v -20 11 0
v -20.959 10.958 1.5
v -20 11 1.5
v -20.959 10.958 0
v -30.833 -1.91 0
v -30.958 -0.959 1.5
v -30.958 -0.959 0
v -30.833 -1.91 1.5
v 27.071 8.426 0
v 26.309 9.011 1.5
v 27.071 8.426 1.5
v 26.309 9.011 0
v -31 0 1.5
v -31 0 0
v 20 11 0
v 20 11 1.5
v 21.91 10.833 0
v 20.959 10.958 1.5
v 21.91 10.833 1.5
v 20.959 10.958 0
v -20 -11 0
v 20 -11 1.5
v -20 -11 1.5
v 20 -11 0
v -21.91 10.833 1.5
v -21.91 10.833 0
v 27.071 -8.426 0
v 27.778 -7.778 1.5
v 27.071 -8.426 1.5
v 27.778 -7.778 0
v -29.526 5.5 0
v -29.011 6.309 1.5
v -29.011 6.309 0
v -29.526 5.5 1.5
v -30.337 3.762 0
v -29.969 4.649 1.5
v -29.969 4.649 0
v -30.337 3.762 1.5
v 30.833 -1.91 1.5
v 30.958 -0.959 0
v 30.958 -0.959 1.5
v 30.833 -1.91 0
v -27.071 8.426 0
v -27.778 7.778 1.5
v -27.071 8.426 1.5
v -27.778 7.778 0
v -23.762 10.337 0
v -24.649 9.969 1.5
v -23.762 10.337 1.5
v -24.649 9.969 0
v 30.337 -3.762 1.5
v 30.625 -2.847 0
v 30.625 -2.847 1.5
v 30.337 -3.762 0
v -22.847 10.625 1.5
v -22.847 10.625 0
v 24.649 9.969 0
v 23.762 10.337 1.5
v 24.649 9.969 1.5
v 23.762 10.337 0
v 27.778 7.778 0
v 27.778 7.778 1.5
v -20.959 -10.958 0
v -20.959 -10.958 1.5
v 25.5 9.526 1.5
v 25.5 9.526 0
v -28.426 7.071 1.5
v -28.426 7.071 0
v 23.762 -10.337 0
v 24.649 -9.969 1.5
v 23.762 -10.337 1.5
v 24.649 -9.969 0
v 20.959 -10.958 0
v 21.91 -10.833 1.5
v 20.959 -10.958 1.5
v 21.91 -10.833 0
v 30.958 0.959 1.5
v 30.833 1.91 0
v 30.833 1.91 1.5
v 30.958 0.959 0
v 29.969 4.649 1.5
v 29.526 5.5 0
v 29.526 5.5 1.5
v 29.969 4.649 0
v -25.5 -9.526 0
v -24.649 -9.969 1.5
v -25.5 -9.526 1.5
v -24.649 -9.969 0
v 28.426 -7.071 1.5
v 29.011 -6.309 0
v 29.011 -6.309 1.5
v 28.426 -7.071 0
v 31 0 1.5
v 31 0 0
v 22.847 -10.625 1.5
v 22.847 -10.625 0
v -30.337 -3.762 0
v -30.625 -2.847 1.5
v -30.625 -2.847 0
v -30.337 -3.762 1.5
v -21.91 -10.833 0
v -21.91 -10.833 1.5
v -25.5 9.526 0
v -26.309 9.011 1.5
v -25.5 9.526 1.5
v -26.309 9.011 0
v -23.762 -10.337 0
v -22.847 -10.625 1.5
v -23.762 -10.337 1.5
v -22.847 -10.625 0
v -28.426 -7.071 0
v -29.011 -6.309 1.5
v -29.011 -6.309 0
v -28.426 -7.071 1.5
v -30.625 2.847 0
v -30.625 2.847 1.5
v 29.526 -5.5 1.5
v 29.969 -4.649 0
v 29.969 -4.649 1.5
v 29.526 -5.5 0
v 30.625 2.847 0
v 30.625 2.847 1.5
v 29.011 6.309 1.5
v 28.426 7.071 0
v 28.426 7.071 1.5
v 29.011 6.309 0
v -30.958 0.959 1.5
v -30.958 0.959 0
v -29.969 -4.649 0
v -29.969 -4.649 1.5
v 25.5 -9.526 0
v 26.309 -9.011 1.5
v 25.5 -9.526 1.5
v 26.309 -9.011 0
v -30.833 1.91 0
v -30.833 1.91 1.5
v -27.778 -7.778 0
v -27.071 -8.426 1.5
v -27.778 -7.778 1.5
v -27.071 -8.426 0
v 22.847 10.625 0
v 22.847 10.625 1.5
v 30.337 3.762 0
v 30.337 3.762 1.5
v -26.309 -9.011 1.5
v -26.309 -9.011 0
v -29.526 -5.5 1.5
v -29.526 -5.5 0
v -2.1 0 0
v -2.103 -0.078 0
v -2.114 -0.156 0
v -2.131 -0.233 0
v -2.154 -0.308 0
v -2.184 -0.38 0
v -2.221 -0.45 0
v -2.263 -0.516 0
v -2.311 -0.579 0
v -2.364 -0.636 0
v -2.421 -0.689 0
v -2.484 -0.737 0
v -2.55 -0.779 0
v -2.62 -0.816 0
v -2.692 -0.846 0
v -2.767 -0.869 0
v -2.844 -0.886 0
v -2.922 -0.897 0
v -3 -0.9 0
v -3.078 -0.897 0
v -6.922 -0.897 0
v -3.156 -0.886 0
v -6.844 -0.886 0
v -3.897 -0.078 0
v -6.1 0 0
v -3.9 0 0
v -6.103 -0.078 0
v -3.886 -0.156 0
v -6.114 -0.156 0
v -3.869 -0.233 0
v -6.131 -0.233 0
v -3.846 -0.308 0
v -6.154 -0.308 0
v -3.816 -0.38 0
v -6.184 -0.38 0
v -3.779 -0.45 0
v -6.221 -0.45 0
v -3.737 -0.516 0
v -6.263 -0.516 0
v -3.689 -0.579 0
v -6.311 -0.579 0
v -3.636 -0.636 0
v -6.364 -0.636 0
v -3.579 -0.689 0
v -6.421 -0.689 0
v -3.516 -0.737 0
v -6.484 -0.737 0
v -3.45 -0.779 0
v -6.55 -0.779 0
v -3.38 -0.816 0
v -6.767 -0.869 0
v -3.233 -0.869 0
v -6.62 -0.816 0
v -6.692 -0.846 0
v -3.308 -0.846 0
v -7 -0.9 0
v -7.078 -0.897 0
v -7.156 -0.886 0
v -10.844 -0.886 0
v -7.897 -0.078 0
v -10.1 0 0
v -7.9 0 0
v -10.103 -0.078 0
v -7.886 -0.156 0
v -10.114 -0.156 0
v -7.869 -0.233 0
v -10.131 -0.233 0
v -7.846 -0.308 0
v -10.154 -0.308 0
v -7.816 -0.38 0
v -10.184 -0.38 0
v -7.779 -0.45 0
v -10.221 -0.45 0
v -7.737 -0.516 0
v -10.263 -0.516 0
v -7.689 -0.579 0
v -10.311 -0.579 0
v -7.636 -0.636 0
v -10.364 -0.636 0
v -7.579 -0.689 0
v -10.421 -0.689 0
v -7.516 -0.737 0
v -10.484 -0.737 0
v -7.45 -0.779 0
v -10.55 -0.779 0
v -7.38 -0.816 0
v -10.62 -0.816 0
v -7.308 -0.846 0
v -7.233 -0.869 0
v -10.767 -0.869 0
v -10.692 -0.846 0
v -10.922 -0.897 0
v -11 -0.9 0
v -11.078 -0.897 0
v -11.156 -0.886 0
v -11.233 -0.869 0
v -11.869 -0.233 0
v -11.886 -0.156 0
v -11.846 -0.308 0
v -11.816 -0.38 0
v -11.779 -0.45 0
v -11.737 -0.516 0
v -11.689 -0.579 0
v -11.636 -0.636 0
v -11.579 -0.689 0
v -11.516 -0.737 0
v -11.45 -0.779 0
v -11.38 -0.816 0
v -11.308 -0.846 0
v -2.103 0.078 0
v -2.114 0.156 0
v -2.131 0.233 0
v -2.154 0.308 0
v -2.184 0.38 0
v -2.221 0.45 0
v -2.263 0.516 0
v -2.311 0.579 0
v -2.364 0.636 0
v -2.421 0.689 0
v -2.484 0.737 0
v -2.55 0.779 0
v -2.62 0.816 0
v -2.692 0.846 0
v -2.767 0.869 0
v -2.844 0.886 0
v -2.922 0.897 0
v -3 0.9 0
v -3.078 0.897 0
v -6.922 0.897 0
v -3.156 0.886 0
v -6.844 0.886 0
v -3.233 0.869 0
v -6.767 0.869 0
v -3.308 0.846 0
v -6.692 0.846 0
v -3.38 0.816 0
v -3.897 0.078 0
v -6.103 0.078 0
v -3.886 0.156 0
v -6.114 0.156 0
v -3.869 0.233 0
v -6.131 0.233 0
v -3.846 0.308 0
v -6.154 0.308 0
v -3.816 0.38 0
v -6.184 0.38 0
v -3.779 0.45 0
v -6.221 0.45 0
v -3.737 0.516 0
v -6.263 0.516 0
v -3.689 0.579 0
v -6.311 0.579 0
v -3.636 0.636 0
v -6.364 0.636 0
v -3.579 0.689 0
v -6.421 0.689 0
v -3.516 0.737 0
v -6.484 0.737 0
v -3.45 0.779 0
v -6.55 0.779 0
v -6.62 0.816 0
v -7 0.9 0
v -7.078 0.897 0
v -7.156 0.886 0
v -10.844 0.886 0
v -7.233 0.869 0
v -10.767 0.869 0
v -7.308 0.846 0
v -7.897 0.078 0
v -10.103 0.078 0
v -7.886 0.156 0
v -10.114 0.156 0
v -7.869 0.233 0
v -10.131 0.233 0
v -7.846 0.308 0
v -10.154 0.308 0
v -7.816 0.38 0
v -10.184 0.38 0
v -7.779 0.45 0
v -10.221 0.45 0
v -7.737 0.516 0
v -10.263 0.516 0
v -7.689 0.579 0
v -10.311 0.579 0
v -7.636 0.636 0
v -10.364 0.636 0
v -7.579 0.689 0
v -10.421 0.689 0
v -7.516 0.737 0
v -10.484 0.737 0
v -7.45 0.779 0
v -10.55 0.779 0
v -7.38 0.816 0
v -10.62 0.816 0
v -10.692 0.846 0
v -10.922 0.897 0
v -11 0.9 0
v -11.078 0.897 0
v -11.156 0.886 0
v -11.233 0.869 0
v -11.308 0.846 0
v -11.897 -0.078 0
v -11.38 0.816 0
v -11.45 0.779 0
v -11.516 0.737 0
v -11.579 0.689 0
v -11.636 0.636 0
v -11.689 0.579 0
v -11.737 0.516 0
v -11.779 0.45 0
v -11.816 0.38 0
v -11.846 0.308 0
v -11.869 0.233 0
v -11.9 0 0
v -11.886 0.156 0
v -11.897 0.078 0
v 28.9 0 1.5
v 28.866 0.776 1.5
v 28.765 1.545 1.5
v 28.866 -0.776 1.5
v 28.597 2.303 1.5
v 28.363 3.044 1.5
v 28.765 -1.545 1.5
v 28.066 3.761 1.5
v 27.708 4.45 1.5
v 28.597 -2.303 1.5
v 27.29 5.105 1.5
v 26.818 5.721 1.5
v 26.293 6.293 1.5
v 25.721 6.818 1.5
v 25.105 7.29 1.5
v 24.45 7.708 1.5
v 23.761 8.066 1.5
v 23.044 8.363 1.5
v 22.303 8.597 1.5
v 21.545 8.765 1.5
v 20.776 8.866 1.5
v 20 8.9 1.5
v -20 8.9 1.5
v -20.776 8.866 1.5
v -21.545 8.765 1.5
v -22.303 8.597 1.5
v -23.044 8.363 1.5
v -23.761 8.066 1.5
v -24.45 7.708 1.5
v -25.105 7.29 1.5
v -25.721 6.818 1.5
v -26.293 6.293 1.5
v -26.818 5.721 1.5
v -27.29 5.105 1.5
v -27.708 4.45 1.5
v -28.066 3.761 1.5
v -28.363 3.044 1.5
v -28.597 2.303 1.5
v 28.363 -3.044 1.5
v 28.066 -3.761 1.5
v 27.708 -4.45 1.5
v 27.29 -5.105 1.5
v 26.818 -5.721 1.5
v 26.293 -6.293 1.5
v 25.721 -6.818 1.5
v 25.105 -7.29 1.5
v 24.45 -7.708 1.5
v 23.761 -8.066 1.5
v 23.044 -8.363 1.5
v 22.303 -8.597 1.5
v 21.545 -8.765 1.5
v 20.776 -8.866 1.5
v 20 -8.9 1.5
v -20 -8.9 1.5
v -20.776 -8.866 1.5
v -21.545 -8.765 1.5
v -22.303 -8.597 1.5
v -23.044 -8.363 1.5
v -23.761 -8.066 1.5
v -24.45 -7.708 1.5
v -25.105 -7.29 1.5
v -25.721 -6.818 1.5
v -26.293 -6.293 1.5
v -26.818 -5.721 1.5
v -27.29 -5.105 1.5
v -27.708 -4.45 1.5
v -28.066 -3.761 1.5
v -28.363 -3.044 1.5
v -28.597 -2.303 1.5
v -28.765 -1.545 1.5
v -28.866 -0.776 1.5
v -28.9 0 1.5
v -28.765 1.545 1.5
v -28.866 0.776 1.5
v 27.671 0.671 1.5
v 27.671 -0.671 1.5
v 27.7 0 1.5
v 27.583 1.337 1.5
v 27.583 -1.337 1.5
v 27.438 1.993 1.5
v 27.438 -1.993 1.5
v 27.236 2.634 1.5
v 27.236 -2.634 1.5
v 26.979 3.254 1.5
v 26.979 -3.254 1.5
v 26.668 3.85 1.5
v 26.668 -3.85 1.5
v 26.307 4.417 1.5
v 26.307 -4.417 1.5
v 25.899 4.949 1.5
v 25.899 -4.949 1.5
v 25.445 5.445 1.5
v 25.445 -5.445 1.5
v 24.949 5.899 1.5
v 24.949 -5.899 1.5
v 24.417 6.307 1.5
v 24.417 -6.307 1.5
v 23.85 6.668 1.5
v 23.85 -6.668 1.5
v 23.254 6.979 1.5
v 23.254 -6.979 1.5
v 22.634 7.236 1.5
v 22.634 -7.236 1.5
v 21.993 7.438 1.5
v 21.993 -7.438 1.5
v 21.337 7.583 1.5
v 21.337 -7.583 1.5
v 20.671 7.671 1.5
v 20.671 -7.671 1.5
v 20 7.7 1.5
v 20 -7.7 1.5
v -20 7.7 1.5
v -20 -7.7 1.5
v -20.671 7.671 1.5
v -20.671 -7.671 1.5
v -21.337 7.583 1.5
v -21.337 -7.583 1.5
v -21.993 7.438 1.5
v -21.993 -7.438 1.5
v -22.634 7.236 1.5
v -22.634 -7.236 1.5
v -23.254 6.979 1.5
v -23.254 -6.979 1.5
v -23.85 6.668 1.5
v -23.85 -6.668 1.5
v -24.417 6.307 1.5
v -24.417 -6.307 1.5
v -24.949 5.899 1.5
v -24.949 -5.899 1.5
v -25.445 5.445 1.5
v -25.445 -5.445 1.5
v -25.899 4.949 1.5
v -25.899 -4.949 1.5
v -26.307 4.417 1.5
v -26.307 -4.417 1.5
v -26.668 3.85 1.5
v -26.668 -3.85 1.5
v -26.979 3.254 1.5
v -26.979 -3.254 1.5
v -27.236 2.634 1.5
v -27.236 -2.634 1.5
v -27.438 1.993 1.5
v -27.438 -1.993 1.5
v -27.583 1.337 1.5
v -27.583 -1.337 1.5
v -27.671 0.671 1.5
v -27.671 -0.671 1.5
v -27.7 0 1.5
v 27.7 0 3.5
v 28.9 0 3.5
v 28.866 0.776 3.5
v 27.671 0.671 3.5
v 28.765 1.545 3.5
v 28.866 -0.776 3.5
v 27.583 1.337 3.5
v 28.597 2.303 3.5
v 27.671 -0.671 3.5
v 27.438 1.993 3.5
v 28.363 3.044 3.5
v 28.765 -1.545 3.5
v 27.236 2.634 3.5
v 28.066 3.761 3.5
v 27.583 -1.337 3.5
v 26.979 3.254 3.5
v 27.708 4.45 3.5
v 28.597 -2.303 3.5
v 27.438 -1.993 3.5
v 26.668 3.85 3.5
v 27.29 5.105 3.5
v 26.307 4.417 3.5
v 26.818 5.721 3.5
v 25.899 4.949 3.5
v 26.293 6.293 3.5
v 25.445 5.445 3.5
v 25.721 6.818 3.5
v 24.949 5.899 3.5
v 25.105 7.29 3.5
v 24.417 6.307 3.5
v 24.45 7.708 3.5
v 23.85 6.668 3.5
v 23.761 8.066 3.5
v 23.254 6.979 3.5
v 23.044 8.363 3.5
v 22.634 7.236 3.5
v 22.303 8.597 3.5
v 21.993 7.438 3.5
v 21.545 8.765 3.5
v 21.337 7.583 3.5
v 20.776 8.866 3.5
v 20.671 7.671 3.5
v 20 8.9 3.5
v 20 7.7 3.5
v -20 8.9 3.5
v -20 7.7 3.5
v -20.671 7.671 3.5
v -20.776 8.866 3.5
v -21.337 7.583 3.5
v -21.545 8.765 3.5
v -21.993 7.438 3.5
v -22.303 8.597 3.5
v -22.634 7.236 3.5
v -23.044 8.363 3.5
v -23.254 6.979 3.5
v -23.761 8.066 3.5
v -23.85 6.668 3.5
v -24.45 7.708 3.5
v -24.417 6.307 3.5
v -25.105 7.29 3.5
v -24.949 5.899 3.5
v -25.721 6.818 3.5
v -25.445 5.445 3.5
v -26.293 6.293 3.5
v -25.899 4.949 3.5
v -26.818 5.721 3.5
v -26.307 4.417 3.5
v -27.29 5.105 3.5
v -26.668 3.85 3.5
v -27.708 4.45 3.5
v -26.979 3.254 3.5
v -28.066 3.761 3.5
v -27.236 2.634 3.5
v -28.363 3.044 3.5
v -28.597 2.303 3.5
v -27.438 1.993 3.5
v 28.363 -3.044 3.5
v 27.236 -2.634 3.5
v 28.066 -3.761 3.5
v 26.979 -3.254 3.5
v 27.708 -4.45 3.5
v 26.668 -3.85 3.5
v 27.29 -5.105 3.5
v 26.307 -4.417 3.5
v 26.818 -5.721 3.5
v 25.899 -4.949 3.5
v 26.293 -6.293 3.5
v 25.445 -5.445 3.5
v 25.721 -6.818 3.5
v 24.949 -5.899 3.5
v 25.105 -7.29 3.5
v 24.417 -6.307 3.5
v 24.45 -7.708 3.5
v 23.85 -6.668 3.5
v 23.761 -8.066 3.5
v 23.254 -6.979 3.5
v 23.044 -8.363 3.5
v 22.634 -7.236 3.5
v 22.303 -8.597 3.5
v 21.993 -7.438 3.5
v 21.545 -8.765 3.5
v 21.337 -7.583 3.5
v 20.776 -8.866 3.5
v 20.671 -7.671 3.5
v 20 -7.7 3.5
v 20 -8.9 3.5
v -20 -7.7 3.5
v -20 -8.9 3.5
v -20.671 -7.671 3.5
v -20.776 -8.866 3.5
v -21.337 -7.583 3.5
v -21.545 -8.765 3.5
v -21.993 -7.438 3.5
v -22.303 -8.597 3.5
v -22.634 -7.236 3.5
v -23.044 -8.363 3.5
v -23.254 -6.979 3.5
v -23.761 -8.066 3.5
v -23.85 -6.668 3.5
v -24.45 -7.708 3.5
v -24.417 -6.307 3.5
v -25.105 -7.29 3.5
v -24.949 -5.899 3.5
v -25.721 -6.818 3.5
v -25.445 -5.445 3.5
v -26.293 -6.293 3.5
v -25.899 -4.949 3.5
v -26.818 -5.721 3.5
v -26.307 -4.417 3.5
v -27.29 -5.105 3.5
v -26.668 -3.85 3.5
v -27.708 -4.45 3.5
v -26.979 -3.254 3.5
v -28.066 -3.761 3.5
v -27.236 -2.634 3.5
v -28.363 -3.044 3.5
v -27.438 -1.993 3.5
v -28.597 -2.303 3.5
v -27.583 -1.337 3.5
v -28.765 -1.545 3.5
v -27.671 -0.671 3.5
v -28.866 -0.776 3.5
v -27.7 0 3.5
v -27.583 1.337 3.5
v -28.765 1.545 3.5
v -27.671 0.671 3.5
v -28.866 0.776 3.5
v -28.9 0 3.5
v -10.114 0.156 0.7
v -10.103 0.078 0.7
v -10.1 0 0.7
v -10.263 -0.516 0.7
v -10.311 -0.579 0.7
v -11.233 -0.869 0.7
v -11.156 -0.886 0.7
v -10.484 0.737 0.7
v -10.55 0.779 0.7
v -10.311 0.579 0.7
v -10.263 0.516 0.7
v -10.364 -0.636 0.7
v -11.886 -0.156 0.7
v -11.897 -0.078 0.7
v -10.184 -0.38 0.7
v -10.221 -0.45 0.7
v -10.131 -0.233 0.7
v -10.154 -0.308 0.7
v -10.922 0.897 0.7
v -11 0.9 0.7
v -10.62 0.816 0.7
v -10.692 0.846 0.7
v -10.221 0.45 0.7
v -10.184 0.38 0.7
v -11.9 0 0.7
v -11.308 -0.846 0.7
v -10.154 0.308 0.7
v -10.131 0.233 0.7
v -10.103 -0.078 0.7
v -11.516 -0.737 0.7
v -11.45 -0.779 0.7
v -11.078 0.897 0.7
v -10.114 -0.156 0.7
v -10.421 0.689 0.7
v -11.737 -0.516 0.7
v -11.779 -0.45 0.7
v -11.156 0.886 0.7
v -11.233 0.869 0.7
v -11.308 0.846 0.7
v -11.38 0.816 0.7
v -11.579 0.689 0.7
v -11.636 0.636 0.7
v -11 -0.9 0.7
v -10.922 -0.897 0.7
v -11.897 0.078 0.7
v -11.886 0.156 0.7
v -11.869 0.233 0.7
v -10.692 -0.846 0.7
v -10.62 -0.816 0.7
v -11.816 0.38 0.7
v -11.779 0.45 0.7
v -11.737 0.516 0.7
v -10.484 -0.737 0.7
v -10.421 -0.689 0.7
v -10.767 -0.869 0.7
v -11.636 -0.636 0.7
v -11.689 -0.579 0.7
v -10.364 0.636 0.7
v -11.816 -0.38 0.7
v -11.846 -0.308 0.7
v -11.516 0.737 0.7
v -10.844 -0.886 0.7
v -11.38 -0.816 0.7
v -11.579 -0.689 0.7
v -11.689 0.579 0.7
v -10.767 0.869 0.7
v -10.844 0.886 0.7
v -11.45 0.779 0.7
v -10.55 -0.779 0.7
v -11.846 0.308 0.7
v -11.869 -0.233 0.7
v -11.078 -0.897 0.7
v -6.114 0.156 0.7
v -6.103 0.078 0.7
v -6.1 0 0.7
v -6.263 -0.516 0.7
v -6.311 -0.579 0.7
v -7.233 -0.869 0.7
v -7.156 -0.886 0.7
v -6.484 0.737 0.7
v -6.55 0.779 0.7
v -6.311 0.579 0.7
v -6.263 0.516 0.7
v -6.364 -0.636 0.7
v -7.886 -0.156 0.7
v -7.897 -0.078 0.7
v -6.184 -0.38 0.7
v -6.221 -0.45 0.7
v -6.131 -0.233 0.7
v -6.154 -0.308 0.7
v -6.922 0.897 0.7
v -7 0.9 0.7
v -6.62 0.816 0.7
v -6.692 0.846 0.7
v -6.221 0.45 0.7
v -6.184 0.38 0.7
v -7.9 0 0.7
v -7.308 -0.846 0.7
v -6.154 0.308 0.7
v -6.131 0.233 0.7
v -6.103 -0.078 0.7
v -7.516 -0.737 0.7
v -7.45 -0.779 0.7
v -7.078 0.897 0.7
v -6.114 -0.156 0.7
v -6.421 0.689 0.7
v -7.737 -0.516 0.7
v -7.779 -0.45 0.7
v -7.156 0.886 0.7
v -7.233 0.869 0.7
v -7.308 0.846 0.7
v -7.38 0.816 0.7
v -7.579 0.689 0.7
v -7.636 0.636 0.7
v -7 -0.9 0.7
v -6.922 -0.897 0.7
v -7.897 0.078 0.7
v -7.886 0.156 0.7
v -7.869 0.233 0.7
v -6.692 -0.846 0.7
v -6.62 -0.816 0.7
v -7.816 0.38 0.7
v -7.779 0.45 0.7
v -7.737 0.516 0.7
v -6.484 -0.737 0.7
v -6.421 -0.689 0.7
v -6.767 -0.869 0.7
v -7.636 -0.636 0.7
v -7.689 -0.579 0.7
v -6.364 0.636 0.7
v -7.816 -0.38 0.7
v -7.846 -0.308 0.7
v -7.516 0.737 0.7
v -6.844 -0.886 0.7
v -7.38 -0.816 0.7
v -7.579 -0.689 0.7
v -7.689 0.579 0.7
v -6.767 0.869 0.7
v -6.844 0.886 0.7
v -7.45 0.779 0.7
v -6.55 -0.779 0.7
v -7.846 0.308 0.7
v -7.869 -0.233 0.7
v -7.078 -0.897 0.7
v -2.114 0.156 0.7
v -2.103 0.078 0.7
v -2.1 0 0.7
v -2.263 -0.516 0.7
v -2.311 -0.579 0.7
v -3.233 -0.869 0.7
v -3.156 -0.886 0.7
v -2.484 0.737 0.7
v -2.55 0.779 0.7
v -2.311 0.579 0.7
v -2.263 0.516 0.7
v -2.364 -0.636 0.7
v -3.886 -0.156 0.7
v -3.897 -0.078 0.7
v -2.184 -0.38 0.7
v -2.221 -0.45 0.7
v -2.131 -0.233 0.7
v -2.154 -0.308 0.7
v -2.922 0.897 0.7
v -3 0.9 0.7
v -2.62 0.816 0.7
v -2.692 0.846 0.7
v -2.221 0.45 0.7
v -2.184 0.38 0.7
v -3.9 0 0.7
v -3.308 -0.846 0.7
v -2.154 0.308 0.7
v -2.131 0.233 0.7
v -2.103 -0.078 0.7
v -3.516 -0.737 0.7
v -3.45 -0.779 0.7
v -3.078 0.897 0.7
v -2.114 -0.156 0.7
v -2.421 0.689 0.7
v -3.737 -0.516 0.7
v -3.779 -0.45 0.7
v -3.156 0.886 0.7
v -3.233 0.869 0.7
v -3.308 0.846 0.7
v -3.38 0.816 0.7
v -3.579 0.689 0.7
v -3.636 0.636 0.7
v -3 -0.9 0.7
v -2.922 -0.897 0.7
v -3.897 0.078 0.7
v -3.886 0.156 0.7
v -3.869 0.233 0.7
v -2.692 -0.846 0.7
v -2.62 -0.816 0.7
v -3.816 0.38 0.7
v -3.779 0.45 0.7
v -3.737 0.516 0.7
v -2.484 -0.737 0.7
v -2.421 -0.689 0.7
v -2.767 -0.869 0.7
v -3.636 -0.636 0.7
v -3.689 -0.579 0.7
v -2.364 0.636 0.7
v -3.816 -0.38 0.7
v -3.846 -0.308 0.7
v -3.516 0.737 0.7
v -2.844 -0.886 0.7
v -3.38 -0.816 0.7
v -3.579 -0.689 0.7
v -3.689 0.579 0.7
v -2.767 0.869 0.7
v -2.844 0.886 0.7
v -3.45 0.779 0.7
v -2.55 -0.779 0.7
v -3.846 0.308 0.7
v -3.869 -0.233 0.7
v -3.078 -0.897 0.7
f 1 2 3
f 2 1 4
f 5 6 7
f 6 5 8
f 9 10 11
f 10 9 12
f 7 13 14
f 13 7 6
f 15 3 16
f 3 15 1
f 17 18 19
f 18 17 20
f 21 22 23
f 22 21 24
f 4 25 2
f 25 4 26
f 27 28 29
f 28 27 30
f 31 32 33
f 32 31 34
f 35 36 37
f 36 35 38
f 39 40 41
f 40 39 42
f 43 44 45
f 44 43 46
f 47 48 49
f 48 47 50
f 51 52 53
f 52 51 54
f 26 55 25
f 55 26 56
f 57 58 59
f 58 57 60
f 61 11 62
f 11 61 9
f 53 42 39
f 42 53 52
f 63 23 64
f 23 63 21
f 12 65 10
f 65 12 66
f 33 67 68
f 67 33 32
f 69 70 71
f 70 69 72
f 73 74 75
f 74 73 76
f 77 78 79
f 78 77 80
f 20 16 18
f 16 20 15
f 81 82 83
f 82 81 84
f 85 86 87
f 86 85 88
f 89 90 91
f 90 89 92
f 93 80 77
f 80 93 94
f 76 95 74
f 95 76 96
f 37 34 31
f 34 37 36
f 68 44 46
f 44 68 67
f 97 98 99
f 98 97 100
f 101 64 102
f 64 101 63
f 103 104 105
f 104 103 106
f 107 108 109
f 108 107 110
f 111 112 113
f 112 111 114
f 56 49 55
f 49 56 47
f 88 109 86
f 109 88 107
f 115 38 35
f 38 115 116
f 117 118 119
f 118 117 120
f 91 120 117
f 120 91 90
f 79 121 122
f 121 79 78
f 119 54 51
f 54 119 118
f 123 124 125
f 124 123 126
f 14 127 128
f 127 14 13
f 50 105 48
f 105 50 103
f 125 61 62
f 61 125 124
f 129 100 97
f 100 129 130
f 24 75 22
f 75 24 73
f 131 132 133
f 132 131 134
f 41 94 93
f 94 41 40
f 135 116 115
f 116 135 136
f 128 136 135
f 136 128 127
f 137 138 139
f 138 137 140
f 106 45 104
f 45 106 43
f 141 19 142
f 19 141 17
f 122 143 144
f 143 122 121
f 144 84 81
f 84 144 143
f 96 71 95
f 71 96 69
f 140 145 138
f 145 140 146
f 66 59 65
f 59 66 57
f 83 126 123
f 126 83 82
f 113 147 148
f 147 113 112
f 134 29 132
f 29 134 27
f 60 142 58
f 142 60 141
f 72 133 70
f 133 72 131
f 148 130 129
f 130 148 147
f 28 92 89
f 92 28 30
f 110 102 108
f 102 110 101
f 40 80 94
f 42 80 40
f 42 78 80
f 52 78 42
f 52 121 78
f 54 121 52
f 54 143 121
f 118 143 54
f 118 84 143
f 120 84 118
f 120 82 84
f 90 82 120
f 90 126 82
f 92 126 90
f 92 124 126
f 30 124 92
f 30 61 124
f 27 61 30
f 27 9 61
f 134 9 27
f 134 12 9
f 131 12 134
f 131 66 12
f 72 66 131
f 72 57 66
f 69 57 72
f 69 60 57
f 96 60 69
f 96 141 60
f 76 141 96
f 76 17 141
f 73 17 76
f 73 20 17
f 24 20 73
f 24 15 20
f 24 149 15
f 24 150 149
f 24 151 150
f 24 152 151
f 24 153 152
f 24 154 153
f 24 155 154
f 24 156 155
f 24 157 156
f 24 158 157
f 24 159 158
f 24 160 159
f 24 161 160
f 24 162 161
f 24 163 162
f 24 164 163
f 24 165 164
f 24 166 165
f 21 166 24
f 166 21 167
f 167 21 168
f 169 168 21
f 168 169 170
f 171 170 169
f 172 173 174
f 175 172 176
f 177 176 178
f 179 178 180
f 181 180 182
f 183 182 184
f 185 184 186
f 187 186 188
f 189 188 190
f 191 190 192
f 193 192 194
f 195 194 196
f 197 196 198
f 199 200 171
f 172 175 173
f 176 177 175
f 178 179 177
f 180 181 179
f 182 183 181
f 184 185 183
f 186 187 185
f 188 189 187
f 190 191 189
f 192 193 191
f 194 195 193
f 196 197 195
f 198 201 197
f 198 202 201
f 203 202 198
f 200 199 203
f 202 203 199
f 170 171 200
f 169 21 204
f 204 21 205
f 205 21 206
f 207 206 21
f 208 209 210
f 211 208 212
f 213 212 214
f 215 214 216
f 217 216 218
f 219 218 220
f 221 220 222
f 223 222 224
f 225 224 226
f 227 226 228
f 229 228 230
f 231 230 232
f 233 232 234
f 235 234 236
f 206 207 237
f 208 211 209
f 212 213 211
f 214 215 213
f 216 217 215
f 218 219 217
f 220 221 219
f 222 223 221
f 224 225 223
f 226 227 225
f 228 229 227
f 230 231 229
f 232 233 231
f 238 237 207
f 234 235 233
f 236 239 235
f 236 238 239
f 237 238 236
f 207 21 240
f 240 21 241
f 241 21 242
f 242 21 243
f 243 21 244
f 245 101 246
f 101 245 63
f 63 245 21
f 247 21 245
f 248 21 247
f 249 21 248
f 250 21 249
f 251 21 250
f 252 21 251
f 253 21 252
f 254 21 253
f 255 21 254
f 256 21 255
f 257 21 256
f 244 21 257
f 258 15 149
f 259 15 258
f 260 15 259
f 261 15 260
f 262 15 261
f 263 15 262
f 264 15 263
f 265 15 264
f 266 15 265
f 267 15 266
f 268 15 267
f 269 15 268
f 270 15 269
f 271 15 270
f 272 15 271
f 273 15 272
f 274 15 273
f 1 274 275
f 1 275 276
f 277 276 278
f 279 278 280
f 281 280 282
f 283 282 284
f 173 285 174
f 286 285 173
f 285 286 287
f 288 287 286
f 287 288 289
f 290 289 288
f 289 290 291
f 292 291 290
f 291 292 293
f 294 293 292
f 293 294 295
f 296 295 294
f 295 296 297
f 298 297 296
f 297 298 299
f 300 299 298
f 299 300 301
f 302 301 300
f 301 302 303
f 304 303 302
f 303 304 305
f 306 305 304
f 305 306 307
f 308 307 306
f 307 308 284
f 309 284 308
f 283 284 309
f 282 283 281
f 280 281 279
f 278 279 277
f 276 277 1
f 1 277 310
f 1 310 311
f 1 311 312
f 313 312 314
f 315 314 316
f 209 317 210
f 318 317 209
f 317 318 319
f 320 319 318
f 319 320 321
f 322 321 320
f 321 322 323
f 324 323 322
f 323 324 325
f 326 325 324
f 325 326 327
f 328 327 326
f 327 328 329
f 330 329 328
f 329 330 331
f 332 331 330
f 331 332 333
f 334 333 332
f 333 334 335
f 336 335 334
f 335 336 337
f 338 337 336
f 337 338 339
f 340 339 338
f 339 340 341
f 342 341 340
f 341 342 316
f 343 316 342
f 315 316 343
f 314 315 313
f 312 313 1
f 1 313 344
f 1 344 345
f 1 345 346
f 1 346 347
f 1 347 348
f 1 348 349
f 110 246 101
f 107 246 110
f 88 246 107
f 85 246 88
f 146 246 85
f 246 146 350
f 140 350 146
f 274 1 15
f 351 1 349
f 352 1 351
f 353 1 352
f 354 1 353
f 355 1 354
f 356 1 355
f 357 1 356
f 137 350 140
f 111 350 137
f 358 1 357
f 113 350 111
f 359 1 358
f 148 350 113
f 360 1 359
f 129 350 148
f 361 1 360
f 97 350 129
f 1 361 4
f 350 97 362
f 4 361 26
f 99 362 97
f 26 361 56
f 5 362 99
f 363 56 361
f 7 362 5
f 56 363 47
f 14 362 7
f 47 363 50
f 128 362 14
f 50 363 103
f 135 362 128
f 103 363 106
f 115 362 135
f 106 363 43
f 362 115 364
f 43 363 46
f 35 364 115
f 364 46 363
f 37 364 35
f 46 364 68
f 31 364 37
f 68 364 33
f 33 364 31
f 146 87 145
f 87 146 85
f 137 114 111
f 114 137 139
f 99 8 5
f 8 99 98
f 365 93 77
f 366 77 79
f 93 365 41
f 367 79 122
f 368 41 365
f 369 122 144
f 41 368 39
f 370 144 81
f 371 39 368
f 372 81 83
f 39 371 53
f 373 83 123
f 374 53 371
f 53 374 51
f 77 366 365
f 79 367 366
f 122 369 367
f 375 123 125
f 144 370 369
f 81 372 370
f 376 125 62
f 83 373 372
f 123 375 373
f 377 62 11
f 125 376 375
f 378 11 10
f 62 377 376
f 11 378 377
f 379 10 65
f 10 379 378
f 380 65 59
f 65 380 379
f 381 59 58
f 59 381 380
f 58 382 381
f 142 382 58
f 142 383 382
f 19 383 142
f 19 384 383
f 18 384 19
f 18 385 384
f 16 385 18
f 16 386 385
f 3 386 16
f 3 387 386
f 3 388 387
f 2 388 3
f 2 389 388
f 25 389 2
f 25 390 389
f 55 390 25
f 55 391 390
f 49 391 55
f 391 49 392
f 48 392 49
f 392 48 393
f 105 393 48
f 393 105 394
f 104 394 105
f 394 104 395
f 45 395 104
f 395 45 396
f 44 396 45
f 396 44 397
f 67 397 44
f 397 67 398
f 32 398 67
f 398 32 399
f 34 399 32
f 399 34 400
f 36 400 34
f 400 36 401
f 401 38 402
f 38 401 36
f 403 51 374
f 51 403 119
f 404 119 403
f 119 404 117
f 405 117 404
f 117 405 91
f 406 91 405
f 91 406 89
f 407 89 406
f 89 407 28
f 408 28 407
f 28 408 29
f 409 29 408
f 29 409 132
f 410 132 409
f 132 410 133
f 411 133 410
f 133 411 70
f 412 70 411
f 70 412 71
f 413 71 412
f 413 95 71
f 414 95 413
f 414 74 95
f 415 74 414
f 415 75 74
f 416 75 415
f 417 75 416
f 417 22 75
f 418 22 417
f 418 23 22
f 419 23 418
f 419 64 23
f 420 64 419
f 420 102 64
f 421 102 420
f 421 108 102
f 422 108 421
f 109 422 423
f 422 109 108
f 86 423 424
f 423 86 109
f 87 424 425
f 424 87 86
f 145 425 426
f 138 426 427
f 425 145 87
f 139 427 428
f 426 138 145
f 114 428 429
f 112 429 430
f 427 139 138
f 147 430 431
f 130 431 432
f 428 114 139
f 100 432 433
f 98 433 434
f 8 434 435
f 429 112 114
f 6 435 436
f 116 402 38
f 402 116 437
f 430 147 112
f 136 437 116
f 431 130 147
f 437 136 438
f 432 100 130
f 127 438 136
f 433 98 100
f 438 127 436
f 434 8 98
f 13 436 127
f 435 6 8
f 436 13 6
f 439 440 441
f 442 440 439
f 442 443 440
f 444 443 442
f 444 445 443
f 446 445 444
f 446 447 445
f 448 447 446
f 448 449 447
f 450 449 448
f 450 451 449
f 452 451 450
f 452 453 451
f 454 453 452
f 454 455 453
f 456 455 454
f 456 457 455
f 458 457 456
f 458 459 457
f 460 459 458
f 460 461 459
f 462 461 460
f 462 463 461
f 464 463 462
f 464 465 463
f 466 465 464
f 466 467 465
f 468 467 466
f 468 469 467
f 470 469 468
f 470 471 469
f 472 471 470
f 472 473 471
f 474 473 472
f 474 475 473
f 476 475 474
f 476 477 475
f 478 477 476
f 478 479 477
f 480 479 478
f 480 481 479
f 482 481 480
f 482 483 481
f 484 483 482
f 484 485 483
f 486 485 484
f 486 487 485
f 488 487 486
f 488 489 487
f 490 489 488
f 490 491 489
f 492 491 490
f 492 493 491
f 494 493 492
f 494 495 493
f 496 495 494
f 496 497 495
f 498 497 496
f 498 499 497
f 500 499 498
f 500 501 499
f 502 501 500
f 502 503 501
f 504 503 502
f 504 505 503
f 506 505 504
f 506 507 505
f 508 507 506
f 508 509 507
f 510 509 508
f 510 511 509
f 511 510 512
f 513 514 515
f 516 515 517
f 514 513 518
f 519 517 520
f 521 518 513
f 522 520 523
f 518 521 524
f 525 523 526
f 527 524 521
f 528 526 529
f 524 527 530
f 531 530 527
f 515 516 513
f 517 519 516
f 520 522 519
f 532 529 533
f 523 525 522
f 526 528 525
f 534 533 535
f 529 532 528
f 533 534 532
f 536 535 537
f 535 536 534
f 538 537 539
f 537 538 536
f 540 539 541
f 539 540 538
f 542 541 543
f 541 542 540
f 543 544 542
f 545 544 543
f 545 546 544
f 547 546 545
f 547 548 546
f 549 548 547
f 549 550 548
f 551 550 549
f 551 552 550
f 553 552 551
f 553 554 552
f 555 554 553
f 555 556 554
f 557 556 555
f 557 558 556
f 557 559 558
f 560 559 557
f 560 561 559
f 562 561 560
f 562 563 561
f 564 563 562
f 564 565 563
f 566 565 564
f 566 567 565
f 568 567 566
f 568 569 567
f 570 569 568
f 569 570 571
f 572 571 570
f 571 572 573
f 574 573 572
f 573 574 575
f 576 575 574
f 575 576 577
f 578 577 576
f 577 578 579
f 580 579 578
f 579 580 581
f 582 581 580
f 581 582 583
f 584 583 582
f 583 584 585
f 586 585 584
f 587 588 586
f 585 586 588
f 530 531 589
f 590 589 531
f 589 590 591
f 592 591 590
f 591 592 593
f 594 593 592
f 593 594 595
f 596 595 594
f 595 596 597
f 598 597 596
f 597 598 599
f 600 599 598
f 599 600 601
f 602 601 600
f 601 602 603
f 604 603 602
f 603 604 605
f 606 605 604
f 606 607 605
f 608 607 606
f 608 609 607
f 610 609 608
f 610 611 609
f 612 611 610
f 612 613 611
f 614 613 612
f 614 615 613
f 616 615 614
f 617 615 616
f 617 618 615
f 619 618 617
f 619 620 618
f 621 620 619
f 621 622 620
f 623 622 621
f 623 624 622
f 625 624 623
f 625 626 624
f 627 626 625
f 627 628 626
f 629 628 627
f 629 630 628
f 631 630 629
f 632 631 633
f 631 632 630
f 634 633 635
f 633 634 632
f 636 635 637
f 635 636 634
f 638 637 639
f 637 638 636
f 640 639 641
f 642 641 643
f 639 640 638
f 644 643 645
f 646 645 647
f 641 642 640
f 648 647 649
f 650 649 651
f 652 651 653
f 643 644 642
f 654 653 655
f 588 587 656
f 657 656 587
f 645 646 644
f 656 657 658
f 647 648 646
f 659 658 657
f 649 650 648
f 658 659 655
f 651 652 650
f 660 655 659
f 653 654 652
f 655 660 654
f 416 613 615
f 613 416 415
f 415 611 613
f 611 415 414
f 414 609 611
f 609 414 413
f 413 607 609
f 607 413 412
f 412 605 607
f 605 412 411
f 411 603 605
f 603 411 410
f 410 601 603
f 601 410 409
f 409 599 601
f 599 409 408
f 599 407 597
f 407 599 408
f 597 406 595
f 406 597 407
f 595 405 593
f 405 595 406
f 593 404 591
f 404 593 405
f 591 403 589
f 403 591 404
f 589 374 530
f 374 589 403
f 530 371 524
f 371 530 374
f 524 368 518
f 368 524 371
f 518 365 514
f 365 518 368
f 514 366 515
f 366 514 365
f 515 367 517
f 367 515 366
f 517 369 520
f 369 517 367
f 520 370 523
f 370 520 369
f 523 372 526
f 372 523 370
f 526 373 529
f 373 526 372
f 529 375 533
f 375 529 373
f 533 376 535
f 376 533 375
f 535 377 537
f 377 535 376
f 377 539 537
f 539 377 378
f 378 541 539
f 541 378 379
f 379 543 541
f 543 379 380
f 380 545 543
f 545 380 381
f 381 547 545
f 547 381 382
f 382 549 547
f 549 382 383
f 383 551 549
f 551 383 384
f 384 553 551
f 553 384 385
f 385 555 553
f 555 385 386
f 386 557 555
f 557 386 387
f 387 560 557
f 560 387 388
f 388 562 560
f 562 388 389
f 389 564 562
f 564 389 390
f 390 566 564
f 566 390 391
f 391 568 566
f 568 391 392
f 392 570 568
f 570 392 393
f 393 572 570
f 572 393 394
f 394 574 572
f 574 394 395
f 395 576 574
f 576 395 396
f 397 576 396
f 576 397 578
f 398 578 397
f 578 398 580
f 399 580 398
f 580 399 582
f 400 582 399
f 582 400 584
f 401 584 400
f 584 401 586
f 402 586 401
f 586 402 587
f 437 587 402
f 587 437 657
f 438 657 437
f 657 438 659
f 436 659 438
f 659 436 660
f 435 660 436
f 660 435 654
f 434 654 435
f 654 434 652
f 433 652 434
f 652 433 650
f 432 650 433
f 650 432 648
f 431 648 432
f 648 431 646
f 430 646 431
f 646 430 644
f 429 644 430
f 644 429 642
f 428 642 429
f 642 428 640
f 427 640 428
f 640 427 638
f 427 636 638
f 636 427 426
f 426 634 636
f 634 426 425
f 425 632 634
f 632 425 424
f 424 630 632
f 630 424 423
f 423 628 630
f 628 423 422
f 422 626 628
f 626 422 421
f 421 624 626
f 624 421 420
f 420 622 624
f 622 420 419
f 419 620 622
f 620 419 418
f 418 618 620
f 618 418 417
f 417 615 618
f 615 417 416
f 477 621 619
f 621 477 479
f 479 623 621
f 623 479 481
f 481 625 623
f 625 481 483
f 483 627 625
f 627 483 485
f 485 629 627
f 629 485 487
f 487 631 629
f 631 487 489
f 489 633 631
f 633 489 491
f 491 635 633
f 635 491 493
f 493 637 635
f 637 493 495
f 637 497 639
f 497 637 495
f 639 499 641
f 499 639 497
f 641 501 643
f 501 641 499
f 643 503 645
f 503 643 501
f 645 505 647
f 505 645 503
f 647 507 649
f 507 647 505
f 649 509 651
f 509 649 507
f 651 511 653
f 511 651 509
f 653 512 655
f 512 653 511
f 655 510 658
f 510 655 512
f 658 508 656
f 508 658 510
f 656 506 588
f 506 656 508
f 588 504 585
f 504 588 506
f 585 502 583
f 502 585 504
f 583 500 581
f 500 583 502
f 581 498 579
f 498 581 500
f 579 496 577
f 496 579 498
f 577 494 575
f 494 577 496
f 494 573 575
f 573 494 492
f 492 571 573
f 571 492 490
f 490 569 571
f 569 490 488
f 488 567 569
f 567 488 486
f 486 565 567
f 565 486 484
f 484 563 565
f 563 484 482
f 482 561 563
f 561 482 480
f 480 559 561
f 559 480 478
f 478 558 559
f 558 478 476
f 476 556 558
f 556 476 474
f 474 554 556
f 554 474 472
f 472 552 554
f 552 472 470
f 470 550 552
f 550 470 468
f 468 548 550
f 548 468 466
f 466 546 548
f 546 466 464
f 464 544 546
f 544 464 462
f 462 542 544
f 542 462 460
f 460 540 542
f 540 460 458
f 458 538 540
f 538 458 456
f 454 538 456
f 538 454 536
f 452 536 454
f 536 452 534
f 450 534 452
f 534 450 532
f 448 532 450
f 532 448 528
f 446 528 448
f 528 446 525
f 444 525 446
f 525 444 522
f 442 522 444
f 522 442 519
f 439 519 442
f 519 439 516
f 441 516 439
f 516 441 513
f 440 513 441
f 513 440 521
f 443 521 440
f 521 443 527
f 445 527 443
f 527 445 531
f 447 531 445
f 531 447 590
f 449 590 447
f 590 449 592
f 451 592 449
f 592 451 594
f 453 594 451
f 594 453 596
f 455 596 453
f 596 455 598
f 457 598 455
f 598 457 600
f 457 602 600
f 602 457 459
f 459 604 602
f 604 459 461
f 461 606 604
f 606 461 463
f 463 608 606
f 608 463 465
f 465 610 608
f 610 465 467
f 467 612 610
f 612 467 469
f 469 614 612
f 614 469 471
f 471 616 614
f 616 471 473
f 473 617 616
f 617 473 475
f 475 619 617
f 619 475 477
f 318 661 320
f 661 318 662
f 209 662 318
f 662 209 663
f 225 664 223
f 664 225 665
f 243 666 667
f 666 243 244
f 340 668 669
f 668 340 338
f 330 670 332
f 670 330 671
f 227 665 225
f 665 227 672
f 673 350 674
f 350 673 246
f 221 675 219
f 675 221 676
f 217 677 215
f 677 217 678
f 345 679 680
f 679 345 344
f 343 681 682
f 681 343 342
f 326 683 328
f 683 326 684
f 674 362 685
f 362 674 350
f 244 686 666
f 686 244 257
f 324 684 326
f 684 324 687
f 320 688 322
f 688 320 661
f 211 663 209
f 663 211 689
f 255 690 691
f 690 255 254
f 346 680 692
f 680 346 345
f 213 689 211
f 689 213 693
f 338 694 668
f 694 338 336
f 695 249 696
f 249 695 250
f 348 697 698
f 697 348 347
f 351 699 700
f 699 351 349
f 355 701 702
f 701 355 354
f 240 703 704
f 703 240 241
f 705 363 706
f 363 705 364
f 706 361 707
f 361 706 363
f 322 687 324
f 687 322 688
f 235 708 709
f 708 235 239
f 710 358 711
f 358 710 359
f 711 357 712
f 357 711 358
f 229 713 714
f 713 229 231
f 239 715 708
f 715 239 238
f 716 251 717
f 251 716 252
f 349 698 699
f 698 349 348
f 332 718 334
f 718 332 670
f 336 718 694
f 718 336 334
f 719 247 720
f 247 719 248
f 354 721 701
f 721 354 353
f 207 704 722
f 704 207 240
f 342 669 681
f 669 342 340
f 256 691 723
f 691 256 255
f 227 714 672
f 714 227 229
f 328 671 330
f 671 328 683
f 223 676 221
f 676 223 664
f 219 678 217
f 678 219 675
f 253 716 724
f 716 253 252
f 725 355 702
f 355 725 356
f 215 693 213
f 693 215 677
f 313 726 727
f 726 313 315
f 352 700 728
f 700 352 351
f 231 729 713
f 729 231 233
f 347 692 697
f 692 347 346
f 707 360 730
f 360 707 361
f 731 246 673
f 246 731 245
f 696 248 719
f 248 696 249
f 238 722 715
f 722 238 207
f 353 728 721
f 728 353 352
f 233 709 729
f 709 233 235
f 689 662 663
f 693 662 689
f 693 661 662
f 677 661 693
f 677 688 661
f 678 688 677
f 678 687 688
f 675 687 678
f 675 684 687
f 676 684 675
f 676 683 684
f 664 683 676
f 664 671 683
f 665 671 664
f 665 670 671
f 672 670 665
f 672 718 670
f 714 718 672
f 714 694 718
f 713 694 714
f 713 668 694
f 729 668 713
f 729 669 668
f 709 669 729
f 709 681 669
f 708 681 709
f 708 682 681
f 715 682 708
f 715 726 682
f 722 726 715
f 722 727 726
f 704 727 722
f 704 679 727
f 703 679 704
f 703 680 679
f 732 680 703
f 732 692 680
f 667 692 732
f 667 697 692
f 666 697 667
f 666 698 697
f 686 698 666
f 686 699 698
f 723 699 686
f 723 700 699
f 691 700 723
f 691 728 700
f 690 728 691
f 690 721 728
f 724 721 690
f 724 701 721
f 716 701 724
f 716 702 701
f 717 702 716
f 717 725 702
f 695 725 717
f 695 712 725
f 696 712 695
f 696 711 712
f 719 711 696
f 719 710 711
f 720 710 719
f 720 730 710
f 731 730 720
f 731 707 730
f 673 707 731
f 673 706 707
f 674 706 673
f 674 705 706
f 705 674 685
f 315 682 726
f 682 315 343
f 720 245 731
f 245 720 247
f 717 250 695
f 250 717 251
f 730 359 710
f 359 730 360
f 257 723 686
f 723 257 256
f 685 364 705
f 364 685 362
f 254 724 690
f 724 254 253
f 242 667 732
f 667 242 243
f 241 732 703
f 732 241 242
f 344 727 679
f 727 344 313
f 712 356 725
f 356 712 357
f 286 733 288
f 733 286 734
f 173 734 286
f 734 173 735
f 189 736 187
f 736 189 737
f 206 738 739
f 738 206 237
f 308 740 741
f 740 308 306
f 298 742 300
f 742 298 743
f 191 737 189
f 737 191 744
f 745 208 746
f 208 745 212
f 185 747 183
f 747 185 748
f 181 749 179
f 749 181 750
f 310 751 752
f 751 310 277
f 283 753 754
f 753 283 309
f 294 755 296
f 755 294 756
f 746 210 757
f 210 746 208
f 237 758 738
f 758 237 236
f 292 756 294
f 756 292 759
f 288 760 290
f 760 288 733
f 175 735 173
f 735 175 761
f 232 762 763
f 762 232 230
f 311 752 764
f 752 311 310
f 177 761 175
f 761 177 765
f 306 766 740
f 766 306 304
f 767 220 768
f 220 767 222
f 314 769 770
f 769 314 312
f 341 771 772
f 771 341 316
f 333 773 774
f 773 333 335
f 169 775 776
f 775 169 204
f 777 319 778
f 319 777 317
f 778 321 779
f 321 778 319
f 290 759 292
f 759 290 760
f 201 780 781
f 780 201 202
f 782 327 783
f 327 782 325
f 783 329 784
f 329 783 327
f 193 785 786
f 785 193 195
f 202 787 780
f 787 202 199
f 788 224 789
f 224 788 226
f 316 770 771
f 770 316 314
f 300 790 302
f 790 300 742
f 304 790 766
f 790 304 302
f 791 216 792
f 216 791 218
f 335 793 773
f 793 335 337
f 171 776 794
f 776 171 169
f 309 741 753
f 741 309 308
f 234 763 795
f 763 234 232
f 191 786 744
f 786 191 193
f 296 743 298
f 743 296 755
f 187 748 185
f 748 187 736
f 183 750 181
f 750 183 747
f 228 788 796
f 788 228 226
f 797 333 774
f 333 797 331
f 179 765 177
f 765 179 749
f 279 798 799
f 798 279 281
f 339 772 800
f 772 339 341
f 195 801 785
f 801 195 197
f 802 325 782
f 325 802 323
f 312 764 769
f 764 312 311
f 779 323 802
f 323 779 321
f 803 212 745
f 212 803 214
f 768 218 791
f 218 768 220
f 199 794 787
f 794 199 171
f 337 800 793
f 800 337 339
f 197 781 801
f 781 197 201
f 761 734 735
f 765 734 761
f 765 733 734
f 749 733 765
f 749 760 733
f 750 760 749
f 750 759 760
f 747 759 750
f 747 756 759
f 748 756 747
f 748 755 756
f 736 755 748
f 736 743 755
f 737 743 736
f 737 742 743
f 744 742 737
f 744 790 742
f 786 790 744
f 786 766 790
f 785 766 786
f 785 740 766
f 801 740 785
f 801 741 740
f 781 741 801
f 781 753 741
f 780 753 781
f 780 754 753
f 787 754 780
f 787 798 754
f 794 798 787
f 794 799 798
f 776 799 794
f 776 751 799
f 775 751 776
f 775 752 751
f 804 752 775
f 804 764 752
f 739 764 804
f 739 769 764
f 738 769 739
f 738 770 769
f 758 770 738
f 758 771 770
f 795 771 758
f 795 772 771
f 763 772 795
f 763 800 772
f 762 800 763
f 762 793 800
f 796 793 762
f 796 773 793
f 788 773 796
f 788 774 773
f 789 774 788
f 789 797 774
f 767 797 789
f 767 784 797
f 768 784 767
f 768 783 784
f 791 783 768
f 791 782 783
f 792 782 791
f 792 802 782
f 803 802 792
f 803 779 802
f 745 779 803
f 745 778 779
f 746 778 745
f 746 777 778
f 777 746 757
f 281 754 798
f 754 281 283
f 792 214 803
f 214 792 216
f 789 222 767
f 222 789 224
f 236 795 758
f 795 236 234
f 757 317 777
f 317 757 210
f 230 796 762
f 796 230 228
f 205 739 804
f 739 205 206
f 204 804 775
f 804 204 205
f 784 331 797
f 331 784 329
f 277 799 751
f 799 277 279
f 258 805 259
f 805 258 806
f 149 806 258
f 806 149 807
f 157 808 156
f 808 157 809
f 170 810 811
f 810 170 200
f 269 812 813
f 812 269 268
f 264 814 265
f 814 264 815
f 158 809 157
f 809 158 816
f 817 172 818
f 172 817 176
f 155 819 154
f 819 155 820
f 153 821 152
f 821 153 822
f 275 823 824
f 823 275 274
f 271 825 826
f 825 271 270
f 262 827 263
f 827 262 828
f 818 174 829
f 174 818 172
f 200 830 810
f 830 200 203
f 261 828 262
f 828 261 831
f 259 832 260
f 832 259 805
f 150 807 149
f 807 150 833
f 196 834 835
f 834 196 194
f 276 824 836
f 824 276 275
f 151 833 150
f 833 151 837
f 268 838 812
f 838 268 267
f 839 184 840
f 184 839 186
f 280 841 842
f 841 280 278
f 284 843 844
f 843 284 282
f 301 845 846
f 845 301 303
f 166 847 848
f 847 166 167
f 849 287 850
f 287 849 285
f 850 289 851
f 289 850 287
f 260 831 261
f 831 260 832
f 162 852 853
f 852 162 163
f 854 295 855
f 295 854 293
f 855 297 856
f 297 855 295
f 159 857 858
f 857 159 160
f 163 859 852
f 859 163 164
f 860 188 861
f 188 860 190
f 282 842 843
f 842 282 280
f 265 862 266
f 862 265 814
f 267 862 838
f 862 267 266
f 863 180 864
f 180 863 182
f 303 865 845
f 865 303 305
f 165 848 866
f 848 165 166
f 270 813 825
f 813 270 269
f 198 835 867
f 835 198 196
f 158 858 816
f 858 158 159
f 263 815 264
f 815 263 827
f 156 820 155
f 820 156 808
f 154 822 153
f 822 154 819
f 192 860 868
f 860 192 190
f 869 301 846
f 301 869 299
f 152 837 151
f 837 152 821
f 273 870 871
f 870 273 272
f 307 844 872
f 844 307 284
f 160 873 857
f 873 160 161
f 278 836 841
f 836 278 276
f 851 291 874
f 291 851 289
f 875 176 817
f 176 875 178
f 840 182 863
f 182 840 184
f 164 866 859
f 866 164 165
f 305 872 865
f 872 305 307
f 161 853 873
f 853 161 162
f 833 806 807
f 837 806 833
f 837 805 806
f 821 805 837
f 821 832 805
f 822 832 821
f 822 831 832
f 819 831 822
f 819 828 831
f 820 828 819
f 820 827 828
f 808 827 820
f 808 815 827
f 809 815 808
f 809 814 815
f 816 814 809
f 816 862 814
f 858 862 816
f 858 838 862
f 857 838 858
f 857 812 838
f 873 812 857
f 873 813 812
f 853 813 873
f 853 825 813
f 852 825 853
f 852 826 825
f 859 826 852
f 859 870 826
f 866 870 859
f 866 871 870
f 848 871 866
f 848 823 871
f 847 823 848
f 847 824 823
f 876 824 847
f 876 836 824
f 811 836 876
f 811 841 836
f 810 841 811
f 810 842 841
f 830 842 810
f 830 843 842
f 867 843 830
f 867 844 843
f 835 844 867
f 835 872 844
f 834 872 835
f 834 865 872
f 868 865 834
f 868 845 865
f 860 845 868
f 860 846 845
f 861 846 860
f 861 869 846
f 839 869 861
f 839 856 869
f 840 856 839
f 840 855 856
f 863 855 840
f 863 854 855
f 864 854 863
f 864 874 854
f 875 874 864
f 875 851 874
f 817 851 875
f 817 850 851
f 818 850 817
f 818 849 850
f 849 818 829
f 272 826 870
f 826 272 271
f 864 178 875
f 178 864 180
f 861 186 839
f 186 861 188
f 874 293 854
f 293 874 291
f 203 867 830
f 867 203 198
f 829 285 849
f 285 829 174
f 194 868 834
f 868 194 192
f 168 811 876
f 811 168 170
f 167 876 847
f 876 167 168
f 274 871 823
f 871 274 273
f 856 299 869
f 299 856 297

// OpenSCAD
// file: ../bolt.scad
bolt_pts  = [[155.0,300.0], [75.0,180.0], [130.0,180.0], [45.0,30.0]];
pixel_pts = [[155.0,300.0], [145.5,285.8], [136.0,271.5], [126.5,257.2], [117.0,243.0], [107.5,228.8], [98.0,214.5], [88.5,200.2], [79.0,186.0], [95.1,180.0], [112.3,180.0], [129.4,180.0], [121.4,164.8], [113.0,149.9], [104.5,135.1], [96.1,120.2], [87.6,105.3], [79.2,90.4], [70.8,75.5], [62.3,60.6], [53.9,45.7], [45.4,30.8]];

// ===== CHARGE lightning-bolt test piece — option C (~18mm channel) =====
bolt_inner     = 18;                       // channel interior (collar O16 fits)
bolt_wall      = 2;                         // wall thickness
bolt_outer     = bolt_inner + 2*bolt_wall; // 22mm outer stroke
bolt_gap       = 15;                       // LED-tip -> lens
bolt_ch_h      = dome_clear + bolt_gap;    // wall height above plate
bolt_lens_t    = 1.5;                       // lens face thickness
bolt_lip_h     = 2;                         // lens locating lip depth
bolt_lip_clear = 0.6;                       // lip clearance into channel
bolt_lip_t     = 1.2;                       // lip wall thickness

module bolt_stroke(w) {
    for (i = [0 : len(bolt_pts) - 2])
        hull() {
            translate(bolt_pts[i])     circle(d = w);
            translate(bolt_pts[i + 1]) circle(d = w);
        }
}

// wall_h = channel wall height above the plate (gap = wall_h - dome_clear).
// The lens caps the cross-section, so the SAME lens fits any wall_h.
module bolt_shell(wall_h = bolt_ch_h) {
    difference() {
        union() {
            linear_extrude(plate_t) bolt_stroke(bolt_outer);
            translate([0, 0, plate_t]) linear_extrude(wall_h)
                difference() { bolt_stroke(bolt_outer); bolt_stroke(bolt_inner); }
        }
        for (p = pixel_pts)
            translate([p[0], p[1], -0.1]) cylinder(h = plate_t + 0.2, d = pixel_through);
    }
    for (p = pixel_pts) place_collar(p[0], p[1]);
}

module bolt_lens() {
    // Pre-mirror: same chirality-on-flip reason as bolt_overcap (this lens is
    // printed face-down and flipped lip-down to drop into the channel).
    mirror([1, 0, 0]) union() {
        linear_extrude(bolt_lens_t) bolt_stroke(bolt_outer);
        translate([0, 0, bolt_lens_t]) linear_extrude(bolt_lip_h)
            difference() {
                bolt_stroke(bolt_inner - bolt_lip_clear);
                bolt_stroke(bolt_inner - bolt_lip_clear - 2 * bolt_lip_t);
            }
    }
}

// ----- snap-OVER lens: a cap that wraps the WHOLE bolt outside (skirt grips the
// 22mm outer wall). Works because the bolt is a single isolated piece. Top = the
// diffuser face. Print top-down, flip in use; fits any bolt height.
// 2-filament: clear for the first cap_top_t (top), white above (skirt) via a
// slicer height color-change. 3-filament: also paint the skirt's outer wall black.
cap_clear   = 0.3;   // skirt-inner = bolt_outer + this (slide/snap over)
cap_wall    = 1.6;   // skirt wall thickness
cap_top_t   = 1.2;   // diffuser top thickness
cap_skirt_h = 9;     // how far the skirt wraps down the bolt sides

module bolt_overcap() {
    si = bolt_outer + cap_clear;
    so = si + 2 * cap_wall;
    // Pre-mirror: this cap prints skirt-up (top face on bed) and is FLIPPED to
    // seat. A flip mirrors the footprint, and the bolt is chiral, so without this
    // the flipped cap is a backwards bolt that won't register. Mirroring here means
    // the flipped part is just a rotation of the bolt footprint -> aligns by eye.
    mirror([1, 0, 0]) union() {
        linear_extrude(cap_top_t) bolt_stroke(so);
        translate([0, 0, cap_top_t]) linear_extrude(cap_skirt_h)
            difference() { bolt_stroke(so); bolt_stroke(si); }
    }
}

// Fit-test chunk: a short straight section of the over-cap at a chosen skirt
// clearance. Slide it onto a straight part of the printed bolt to feel the fit.
// `marks` debossed dots on the bed face = which one it is (more dots = tighter).
module cap_chunk(clear, marks, L = 45) {
    si = bolt_outer + clear;
    so = si + 2 * cap_wall;
    difference() {
        union() {
            linear_extrude(cap_top_t)
                hull() { translate([-L/2,0]) circle(d=so); translate([L/2,0]) circle(d=so); }
            translate([0,0,cap_top_t]) linear_extrude(cap_skirt_h)
                difference() {
                    hull() { translate([-L/2,0]) circle(d=so); translate([L/2,0]) circle(d=so); }
                    hull() { translate([-L/2,0]) circle(d=si); translate([L/2,0]) circle(d=si); }
                }
        }
        for (i = [0 : marks - 1])
            translate([-L/2 + 9 + i*4, 0, -0.1]) cylinder(h = 0.8, d = 1.8);
    }
}

// Fit-test slice of the INNER lens: a short STRAIGHT section of the lens face +
// locating lip at a chosen lip clearance. Press the lip into a straight run of
// the printed channel (the bolt's middle segment is ~55mm straight) to feel the
// fit -- no need to print a whole lightning bolt. `clear` = total lip clearance
// into the channel (lip outer = bolt_inner - clear); SMALLER = tighter. `marks`
// debossed dots on the bed/face = which one (more dots = tighter). Straight =>
// mirror-symmetric, so no chirality concern (unlike the full lens).
module lens_chunk(clear, marks, L = 40) {
    lip_o = bolt_inner - clear;          // lip outer width (drops into channel)
    lip_i = lip_o - 2 * bolt_lip_t;      // lip inner width
    difference() {
        union() {
            // face: full outer width, bed-face down
            linear_extrude(bolt_lens_t)
                hull() { translate([-L/2,0]) circle(d=bolt_outer); translate([L/2,0]) circle(d=bolt_outer); }
            // locating lip on top of the face
            translate([0,0,bolt_lens_t]) linear_extrude(bolt_lip_h)
                difference() {
                    hull() { translate([-L/2,0]) circle(d=lip_o); translate([L/2,0]) circle(d=lip_o); }
                    hull() { translate([-L/2,0]) circle(d=lip_i); translate([L/2,0]) circle(d=lip_i); }
                }
        }
        for (i = [0 : marks - 1])
            translate([-L/2 + 9 + i*4, 0, -0.1]) cylinder(h = 0.8, d = 1.8);
    }
}
// file: ../collar.scad
// Calibrated press-fit collar, merged into the rear wall at each pixel.
// The STL is symmetric top/bottom (retention lip at mid-height), so insertion
// direction does not matter. Native STL sits X-centered at collar_cx, Z 0..collar_h.

module collar_solid() {
    translate([-collar_cx, 0, 0])
        import(collar_stl, convexity = 6);
}

module place_collar(x, y) {
    translate([x, y, 0]) collar_solid();
}
// file: ../config.scad
// ===== CHARGE LED sign — global config =====
// Edit this file; then run ./build.sh to regenerate every STL.

$fn = 72;

// ---- calibrated collar (press-fit for 12mm bullet pixel) ----
collar_stl    = "../../assets/bullet-collar.stl"; // path resolved from src/parts/ entry files
collar_h      = 2.0;     // Z span of the collar STL
collar_od     = 16.0;    // collar outer diameter
collar_cx     = 43.0;    // STL native X center (Y center is 0)
pixel_through = 12.3;    // clearance hole through the plate (just over bore Ø12.19)
dome_clear    = 4.0;     // dome protrusion above plate front. Spec: 5.5mm dome-tip-to-flange,
                         // flange seats on plate back, minus 2mm plate ~= 3.5-4mm. Seat a real
                         // pixel and measure to lock it in.

// ---- shell ----
plate_t    = 2.0;        // rear plate thickness (== collar_h, so the collar sits flush)
wall_t     = 2.5;        // chimney wall thickness
cell_inner = 30;         // square interior of each test cell (the press-fit opening)

// ---- diffuser panels (flat, drop-in — kept for the final glued option) ----
panel_press_clear = 0.25; // panel is this much SMALLER than the opening (total) -> friction fit
panel_thicks      = [1, 2, 3];

// ---- diffuser CAP (slides over an ISOLATED chimney; not used on touching rows) ----
cap_fit_clear = 0.4;   // skirt-inner minus chimney-outer (total); bigger = looser slide
cap_skirt_t   = 1.6;   // skirt wall thickness
cap_skirt_h   = 7;     // how far the skirt grips down over the chimney

// ---- diffuser LID = flanged plug (plug locates in the opening, flange catches on the rim) ----
lid_flange_cover = wall_t;  // flange overhang per side ~= wall width (rests on rim, can't fall in)
lid_flange_gap   = 0.3;     // shrink the flange a hair so neighbour lids don't clash
lid_plug_h       = 4;       // how far the plug drops into the opening (0 = plain flat tile)
lid_plug_clear   = 0.2;     // plug-outer = opening minus this (total) -> friction fit
                            // (was 0.5/loose; PETG plug in a PLA hole grips well at 0.2)
lid_plug_wall    = 1.5;     // plug-frame wall thickness

// ---- coupon depth ladder ----
led_gaps = [10, 15, 20]; // clear LED-tip -> diffuser distance, per cell (mm)
                         // (was [20,35,50] — 35/50 went too dim/washed; 20 is the new max)

// ---- collar v2: original bore + lip, plus a 45-deg lead-in chamfer ----
bore_face_r   = 6.10;    // collar bore radius at each face (~Ø12.2)
chamfer_depth = 0.5;     // axial depth of the 45-deg lead-in at each face
mouth_r       = bore_face_r + chamfer_depth;  // chamfer mouth radius (~Ø13.2)

// ---- collar A/B test harness ----
harness_w     = 52;      // tile width
harness_d     = 30;      // tile depth
harness_t     = plate_t; // match the real wall thickness for a faithful fit test
harness_pitch = 24;      // spacing between the two hole centers

// ---- derived ----
cell_pitch = cell_inner + 2 * wall_t;      // outer cell footprint (35)
n_cells    = len(led_gaps);
plate_w    = n_cells * cell_pitch;
plate_d    = cell_pitch;
panel_side = cell_inner - panel_press_clear;
function cell_x(i)     = i * cell_pitch + cell_pitch / 2;   // column center (distance)
function cell_y(j)     = j * cell_pitch + cell_pitch / 2;   // row center (for grid coupons)
function chimney_H(i)  = plate_t + dome_clear + led_gaps[i];
// main file
// Fit test: inner-lens lip clearance 0.2mm (3 dots).
include <../config.scad>
include <../collar.scad>
include <../bolt.scad>
lens_chunk(0.2, 3);
